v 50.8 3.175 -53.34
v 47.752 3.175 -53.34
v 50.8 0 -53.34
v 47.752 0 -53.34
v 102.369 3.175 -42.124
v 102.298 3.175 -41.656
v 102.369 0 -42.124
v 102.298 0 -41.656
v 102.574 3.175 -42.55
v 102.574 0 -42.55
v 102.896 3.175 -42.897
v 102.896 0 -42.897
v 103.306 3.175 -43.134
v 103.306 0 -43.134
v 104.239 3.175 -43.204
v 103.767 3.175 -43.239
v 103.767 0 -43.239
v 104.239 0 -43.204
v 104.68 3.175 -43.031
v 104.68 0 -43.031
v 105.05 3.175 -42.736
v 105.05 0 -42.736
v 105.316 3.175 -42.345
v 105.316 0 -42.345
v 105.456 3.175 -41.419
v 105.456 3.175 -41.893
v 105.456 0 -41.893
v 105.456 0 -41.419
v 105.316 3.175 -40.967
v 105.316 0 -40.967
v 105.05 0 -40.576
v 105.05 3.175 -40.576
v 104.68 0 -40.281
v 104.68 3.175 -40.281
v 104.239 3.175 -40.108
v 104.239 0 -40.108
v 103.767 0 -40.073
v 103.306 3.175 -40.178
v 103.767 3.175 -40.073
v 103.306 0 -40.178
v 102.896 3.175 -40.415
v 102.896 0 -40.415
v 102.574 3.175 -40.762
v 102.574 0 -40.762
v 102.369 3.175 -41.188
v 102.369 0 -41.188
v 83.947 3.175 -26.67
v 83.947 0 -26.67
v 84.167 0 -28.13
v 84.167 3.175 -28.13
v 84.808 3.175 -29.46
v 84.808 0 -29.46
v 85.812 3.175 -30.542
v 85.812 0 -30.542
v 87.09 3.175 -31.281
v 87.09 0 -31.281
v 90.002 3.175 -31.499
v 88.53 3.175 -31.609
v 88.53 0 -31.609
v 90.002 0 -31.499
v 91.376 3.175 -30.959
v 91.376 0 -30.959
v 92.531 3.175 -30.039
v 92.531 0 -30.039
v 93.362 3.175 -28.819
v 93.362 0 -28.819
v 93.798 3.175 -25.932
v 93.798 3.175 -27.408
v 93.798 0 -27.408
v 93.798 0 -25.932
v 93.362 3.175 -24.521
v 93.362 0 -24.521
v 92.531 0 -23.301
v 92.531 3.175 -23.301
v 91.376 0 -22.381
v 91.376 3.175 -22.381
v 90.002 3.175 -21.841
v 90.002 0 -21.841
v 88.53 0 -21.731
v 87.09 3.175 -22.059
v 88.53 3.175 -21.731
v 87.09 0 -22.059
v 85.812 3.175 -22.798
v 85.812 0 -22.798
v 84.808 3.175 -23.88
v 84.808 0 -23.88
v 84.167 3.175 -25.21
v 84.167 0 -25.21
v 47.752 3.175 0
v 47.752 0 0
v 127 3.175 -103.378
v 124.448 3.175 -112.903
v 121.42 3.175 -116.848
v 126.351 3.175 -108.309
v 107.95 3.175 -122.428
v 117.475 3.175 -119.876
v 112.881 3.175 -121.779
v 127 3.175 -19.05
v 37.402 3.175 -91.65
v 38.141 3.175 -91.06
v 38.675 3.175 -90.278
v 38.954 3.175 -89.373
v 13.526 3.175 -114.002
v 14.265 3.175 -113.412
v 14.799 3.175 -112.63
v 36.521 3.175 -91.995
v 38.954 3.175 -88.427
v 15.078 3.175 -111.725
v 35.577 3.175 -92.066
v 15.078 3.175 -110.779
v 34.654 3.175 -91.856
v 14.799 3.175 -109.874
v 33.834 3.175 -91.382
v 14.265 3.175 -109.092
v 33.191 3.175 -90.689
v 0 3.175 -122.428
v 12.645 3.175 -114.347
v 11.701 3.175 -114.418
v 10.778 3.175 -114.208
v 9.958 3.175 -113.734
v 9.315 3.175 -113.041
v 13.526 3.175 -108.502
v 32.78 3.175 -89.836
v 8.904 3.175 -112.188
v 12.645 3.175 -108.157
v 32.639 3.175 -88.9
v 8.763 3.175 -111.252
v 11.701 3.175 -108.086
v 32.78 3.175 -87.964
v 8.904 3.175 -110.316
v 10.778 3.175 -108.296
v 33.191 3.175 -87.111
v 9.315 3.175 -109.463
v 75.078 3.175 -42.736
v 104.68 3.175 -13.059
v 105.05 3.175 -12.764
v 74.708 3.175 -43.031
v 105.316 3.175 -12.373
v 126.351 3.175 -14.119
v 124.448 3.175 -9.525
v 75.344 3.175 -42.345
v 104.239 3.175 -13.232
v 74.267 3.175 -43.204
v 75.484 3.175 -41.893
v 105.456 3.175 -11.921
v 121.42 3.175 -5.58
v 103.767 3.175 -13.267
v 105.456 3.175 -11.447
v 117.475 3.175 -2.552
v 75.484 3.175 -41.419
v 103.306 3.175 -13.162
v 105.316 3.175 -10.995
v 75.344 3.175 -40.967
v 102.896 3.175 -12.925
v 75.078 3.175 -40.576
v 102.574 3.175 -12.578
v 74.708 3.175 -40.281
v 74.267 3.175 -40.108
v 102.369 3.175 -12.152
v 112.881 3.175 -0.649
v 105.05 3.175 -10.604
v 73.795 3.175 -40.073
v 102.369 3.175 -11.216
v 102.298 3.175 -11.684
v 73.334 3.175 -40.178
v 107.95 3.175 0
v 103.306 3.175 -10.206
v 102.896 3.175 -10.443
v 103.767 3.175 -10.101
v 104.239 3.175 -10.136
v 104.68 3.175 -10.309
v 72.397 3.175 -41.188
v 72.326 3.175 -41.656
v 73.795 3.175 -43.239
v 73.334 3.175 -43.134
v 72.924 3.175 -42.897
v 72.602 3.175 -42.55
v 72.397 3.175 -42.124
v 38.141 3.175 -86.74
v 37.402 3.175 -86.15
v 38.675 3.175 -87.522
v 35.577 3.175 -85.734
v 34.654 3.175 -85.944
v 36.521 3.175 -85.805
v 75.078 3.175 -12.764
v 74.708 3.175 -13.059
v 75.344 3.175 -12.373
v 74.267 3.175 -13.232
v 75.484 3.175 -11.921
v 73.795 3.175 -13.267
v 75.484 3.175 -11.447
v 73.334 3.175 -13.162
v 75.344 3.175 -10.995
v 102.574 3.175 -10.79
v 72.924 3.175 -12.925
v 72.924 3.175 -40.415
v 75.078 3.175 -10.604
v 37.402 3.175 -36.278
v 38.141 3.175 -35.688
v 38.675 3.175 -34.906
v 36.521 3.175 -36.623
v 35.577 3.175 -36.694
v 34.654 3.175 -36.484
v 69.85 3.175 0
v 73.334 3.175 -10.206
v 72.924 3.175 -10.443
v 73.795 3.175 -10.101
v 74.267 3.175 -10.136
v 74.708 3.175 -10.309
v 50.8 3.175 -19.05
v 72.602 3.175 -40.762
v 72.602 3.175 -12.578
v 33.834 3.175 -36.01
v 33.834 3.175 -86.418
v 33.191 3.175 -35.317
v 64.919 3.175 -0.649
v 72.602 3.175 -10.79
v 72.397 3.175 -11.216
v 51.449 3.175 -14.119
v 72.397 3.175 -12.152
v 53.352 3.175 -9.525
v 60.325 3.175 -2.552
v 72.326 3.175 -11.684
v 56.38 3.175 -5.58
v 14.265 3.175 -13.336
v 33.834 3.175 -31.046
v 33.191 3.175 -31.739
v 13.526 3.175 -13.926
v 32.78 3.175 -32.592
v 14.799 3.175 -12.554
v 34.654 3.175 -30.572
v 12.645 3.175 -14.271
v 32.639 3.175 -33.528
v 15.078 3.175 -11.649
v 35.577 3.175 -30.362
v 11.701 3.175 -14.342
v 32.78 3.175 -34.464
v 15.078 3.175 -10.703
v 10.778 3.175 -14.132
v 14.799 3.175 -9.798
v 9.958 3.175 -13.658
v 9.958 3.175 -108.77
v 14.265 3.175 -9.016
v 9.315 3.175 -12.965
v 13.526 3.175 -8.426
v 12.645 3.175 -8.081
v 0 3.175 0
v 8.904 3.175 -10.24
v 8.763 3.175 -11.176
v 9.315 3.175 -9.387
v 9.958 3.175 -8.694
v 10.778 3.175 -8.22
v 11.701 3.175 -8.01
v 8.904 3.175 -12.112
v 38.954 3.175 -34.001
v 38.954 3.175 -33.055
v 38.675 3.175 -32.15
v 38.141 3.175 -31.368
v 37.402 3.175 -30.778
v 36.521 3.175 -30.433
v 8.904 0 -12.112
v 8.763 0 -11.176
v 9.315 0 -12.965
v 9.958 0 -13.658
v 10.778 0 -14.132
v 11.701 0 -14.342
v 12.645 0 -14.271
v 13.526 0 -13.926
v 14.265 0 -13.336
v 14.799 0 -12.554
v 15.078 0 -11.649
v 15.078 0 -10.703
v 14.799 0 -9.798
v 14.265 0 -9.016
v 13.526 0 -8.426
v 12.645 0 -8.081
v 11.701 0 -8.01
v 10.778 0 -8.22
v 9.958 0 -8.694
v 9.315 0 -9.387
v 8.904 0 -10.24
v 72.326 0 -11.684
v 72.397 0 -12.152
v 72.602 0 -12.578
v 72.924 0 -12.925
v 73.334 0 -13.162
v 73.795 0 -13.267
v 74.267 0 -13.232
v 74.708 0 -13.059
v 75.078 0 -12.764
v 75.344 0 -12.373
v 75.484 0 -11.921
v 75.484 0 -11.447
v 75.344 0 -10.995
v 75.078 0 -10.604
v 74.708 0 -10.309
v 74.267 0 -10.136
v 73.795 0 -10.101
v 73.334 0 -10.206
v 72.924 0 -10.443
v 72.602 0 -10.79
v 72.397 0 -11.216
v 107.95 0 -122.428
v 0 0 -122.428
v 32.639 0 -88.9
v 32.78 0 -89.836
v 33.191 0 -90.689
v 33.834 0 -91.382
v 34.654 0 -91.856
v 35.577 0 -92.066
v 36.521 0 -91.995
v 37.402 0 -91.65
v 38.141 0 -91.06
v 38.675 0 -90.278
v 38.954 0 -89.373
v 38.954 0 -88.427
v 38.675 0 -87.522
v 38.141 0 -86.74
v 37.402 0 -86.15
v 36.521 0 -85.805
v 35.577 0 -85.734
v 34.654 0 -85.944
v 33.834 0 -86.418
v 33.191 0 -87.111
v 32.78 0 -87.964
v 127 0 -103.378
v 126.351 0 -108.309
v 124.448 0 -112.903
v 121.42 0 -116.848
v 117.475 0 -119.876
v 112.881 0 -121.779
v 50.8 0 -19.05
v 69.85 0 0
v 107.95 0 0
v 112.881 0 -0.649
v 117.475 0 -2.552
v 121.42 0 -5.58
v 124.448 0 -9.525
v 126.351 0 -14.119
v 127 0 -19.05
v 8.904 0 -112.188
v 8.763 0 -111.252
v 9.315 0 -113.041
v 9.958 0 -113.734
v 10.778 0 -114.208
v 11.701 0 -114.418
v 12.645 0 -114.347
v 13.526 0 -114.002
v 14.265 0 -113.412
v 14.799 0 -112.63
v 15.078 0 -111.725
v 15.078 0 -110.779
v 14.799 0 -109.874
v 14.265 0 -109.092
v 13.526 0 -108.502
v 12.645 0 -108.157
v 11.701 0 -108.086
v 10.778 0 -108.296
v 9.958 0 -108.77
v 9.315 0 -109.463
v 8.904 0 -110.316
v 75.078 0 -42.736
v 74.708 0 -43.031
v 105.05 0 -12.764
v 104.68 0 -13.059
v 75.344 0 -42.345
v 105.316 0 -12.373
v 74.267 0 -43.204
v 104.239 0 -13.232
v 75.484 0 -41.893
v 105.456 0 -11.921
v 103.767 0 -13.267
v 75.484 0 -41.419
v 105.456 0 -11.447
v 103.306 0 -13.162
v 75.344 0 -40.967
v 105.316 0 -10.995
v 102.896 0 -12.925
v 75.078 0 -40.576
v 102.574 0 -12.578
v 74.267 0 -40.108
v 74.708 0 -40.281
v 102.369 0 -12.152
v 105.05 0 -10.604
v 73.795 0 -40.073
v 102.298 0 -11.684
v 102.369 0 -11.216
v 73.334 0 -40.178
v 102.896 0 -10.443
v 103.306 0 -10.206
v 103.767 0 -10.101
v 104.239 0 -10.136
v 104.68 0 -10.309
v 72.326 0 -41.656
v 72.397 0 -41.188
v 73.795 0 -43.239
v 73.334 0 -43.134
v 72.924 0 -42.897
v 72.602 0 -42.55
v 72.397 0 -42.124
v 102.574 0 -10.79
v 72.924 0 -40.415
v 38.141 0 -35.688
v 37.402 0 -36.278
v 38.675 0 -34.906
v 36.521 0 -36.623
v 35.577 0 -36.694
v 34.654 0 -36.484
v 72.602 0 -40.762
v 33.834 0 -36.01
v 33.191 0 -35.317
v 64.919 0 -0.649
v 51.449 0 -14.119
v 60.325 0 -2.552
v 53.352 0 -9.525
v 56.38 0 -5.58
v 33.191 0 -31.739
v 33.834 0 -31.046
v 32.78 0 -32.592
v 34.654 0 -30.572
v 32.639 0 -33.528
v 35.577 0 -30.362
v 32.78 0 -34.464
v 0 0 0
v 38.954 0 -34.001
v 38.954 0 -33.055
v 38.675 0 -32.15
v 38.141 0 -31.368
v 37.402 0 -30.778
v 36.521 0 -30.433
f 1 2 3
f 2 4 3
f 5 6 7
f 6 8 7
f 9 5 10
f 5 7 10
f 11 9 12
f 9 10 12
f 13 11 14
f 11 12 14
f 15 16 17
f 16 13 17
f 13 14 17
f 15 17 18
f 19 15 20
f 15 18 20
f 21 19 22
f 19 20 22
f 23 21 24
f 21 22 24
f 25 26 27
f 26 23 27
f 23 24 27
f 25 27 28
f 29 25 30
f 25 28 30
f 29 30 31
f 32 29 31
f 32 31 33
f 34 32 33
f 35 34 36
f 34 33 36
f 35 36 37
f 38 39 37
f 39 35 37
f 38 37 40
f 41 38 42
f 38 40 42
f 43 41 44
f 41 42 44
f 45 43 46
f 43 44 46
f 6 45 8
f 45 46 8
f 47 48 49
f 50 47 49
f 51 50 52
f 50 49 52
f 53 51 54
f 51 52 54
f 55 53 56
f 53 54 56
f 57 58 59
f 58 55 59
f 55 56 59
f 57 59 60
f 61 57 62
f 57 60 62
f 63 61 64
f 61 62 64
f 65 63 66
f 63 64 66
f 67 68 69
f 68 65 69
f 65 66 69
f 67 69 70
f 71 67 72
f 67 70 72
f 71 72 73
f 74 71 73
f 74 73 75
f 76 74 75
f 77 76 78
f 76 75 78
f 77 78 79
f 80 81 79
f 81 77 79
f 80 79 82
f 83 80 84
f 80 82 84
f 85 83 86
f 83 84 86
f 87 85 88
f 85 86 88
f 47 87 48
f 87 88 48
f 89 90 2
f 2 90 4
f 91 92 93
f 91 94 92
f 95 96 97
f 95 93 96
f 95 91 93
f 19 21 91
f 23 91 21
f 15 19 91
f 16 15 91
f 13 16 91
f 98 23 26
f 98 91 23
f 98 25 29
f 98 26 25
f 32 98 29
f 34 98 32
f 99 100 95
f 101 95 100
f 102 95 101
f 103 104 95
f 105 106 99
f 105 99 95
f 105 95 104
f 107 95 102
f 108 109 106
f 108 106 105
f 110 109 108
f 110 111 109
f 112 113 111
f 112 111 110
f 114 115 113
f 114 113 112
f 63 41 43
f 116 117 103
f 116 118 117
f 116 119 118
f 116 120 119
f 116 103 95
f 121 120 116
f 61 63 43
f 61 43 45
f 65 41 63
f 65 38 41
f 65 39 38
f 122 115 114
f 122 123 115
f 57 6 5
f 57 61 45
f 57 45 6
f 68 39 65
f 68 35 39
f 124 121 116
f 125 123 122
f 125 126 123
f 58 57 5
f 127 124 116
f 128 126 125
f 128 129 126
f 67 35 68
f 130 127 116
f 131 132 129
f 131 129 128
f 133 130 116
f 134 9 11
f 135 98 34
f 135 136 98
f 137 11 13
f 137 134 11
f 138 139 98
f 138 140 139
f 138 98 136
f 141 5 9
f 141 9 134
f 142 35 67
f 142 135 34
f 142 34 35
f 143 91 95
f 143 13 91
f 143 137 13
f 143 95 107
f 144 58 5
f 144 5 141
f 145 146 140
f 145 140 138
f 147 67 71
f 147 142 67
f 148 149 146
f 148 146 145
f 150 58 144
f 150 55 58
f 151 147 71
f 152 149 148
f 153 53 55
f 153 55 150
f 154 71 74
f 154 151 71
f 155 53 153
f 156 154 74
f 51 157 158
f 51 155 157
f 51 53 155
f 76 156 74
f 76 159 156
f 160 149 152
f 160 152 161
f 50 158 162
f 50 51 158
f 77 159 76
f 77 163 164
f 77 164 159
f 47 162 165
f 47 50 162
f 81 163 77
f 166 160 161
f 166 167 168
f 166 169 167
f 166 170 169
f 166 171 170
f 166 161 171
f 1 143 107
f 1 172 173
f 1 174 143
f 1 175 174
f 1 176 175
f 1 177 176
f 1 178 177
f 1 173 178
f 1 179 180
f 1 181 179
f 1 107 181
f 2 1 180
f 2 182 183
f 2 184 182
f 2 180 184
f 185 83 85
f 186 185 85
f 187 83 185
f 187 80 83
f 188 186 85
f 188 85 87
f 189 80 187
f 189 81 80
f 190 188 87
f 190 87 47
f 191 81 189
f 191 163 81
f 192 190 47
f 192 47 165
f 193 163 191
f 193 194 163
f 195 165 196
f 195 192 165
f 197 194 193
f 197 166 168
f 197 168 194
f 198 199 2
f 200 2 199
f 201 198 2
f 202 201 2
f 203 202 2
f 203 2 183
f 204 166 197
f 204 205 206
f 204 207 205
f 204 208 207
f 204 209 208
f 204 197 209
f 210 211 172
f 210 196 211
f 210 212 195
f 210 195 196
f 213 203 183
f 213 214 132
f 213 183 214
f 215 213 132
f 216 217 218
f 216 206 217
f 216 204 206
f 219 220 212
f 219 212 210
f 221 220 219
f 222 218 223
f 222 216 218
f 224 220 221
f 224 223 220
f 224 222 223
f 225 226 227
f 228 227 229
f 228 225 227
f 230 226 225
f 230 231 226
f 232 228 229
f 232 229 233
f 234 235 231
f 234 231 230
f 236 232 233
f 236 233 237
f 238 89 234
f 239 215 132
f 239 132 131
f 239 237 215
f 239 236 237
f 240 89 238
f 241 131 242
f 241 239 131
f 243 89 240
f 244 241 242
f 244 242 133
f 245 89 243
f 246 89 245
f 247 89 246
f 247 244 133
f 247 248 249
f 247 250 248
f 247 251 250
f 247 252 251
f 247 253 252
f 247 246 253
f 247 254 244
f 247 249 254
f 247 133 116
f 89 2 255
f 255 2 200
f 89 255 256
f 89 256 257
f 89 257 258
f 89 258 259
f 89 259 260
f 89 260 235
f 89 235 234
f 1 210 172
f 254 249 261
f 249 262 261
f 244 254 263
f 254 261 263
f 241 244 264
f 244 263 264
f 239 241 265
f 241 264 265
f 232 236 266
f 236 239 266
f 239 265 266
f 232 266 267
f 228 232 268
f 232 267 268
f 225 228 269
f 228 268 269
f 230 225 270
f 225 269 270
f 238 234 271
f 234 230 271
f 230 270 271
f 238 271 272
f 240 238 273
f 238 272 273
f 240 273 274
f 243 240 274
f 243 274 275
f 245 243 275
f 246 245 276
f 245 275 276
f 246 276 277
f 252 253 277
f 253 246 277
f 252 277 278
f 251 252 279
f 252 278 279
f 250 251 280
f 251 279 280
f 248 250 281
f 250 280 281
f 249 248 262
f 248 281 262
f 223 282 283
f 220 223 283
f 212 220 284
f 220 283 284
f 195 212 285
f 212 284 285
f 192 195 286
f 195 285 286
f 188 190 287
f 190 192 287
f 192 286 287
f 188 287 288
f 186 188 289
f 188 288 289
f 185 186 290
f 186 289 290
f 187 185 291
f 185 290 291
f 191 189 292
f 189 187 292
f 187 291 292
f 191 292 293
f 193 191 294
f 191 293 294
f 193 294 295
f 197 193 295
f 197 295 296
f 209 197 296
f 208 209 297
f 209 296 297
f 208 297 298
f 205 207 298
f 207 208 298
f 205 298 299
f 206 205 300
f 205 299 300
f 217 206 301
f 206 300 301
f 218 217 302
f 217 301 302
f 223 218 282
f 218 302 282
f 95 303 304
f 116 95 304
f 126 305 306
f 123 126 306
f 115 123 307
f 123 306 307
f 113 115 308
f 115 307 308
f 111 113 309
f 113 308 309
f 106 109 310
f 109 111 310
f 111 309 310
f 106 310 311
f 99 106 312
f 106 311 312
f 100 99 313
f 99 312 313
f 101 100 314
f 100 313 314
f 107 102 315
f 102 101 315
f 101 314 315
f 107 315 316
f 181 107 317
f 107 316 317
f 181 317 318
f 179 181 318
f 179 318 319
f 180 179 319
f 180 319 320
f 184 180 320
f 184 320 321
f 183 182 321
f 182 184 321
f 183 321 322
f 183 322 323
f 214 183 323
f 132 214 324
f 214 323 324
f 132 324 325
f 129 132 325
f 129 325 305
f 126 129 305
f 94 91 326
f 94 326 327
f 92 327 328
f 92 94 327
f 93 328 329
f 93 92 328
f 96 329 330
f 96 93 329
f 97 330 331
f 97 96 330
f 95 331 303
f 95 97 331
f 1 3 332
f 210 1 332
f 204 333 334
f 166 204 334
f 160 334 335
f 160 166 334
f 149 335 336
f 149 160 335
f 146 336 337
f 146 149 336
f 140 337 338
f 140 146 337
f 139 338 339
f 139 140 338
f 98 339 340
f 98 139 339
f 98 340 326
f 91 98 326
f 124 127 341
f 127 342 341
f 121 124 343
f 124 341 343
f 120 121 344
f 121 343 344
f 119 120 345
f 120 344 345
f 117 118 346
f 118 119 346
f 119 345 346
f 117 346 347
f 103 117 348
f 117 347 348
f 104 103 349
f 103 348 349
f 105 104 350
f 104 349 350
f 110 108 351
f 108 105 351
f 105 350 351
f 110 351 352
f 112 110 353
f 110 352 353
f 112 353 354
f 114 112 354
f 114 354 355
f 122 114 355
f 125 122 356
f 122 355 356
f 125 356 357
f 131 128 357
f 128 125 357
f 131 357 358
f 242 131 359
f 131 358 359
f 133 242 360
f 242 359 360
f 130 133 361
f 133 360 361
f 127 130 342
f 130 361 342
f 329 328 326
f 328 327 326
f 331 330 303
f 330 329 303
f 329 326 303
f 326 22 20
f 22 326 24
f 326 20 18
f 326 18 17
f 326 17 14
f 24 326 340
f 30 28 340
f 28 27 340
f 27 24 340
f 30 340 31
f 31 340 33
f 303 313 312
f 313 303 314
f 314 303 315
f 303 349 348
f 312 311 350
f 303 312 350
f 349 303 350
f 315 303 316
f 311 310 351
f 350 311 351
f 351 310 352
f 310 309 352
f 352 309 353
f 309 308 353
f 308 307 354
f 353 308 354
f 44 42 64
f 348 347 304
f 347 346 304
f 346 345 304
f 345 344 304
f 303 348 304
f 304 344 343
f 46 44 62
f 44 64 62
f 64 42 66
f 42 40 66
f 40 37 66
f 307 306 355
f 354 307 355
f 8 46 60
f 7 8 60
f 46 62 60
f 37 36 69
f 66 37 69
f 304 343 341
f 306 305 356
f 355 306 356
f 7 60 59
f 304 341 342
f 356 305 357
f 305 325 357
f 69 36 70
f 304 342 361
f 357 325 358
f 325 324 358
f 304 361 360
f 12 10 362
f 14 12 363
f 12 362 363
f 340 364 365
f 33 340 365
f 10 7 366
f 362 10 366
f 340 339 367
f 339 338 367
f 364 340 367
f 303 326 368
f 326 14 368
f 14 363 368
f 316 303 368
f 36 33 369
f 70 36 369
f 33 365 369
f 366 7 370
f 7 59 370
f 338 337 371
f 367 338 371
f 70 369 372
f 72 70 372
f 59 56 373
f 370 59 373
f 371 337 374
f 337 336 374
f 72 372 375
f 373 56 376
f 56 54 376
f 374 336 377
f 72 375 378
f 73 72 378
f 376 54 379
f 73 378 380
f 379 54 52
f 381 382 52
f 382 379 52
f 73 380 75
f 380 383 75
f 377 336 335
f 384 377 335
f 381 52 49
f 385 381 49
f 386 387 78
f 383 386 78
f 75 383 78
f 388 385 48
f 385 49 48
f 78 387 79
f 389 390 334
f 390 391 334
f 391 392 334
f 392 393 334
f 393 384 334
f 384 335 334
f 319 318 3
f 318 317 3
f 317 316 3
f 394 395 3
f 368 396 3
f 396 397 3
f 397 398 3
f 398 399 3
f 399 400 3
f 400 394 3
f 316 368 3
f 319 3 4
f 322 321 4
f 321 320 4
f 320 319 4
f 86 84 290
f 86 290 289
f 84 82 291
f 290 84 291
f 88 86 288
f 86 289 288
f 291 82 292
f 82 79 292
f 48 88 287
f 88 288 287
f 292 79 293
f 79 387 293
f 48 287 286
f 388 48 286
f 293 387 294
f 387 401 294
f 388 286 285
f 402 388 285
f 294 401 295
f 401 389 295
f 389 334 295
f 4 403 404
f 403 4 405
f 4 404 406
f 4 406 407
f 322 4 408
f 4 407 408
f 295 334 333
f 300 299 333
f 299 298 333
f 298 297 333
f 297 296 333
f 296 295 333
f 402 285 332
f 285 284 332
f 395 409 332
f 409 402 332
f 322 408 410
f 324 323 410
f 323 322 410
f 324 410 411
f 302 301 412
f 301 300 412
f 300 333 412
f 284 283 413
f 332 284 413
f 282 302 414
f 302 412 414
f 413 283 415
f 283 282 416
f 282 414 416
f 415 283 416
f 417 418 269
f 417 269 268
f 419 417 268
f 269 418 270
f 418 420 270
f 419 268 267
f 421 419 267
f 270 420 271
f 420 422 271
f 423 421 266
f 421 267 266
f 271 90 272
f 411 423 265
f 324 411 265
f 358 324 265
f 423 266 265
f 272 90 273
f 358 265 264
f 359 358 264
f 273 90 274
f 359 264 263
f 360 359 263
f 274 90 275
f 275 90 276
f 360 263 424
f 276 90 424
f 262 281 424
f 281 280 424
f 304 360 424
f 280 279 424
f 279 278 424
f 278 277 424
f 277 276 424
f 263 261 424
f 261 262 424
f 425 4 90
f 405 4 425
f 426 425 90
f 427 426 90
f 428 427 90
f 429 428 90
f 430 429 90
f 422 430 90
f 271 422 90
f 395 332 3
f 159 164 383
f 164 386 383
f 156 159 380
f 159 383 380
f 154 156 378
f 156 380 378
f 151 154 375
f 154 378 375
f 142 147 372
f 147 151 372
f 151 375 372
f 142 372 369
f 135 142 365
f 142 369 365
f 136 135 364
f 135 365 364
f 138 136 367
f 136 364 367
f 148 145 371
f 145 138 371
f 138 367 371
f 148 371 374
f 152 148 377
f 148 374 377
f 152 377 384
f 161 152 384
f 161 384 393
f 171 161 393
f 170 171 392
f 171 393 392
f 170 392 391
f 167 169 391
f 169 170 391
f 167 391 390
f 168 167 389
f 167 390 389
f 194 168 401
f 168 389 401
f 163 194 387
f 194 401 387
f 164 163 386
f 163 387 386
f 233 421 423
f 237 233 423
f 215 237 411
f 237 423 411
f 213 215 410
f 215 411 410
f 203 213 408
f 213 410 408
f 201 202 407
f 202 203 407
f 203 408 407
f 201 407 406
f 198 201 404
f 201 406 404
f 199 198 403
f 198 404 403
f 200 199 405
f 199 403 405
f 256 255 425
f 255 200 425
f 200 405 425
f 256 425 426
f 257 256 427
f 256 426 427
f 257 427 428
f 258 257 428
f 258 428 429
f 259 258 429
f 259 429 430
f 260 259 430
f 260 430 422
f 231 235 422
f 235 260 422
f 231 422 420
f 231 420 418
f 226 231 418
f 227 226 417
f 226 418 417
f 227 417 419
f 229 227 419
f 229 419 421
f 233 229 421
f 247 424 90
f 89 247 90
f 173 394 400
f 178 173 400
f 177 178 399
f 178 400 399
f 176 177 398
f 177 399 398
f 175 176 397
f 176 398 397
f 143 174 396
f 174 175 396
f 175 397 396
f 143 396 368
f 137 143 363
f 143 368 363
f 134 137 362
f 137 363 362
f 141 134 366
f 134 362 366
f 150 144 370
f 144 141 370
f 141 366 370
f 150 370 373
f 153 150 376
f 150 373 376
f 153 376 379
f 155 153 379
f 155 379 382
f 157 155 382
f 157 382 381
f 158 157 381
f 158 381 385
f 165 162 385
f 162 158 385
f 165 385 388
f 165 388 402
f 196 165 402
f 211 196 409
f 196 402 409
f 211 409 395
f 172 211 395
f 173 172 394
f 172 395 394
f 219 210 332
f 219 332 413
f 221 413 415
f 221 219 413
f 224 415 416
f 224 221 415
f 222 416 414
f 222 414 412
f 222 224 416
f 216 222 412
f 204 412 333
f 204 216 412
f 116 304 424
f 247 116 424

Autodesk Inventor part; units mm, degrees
ref_plane "YZ Plane" through (0, 0, 0) normal (1, 0, 0) x (0, 1, 0)
ref_plane "XZ Plane" through (0, 0, 0) normal (0, 1, 0) x (-1, 0, 0)
ref_plane "XY Plane" through (0, 0, 0) normal (0, 0, 1) x (1, 0, 0)
sketch "Sketch1" plane through (0, 0, 0) normal (0, 1, 0) x (-1, 0, 0)
  line L0 (0, 0) -> (-127, 0)
  line L1 (-127, 0) -> (-127, -122.428)
  line L2 (-127, -122.428) -> (0, -122.428)
  line L3 (0, -122.428) -> (0, 0)
  line L4 (0, 0) -> (-47.752, 0)
  line L5 (-47.752, 0) -> (-47.752, -53.34)
  line L6 (-47.752, -53.34) -> (0, -53.34)
  line L7 (0, -53.34) -> (0, 0)
  line L8 (-127, -122.428) -> (-50.8, -122.428)
  line L9 (-50.8, -122.428) -> (-50.8, 0)
  line L10 (-50.8, 0) -> (-127, 0)
  line L11 (-127, 0) -> (-127, -122.428)
  line L12 (-47.752, -53.34) -> (-50.8, -53.34)
  line L13 (-50.8, -53.34) -> (-50.8, 0)
  line L14 (-50.8, 0) -> (-47.752, 0)
  line L15 (-47.752, 0) -> (-47.752, -53.34)
  circle A0 centre (-11.938, -11.176) radius 3.175
  circle A1 centre (-35.814, -33.528) radius 3.175
  circle A2 centre (-11.938, -111.252) radius 3.175
  circle A3 centre (-35.814, -88.9) radius 3.175
  circle A4 centre (-73.914, -11.684) radius 1.5875
  circle A5 centre (-73.914, -41.656) radius 1.5875
  circle A6 centre (-103.886, -41.656) radius 1.5875
  circle A7 centre (-103.886, -11.684) radius 1.5875
  circle A8 centre (-88.9, -26.67) radius 4.953
  dimension "d0" = 127
  dimension "d1" = 122.428
  dimension "d2" = 47.752
  dimension "d3" = 53.34
  dimension "d4" = 76.2
  dimension "d5" = 11.176
  dimension "d6" = 22.352
  dimension "d7" = 38.1
  dimension "d8" = 14.986
  dimension "d9" = 14.986
  dimension "d10" = 14.986
  dimension "d11" = 14.986
  dimension "d12" = 6.35
  dimension "d13" = 6.35
  dimension "d14" = 6.35
  dimension "d15" = 6.35
  dimension "d16" = 3.175
  dimension "d17" = 3.175
  dimension "d18" = 3.175
  dimension "d19" = 3.175
  dimension "d20" = 9.906
  dimension "d21" = 11.176
  dimension "d22" = 11.938
  dimension "d23" = 23.876
  dimension "d24" = 22.352
  dimension "d25" = 11.938
  dimension "d26" = 11.938
  dimension "d27" = 23.876
extrude "Extrusion1" add sketch "Sketch1" along normal blind 3.175 contours L3 L6 L5 L0 | L3 L2 L9 L12 L6 | L9 L2 L1 L0
fillet "Fillet1" radius 19.05 3 edges at (127, 1.5875, 0) (50.8, 1.5875, 0) (127, 1.5875, -122.428)
properties part number "ARMS MOUNTING BRACKET"
